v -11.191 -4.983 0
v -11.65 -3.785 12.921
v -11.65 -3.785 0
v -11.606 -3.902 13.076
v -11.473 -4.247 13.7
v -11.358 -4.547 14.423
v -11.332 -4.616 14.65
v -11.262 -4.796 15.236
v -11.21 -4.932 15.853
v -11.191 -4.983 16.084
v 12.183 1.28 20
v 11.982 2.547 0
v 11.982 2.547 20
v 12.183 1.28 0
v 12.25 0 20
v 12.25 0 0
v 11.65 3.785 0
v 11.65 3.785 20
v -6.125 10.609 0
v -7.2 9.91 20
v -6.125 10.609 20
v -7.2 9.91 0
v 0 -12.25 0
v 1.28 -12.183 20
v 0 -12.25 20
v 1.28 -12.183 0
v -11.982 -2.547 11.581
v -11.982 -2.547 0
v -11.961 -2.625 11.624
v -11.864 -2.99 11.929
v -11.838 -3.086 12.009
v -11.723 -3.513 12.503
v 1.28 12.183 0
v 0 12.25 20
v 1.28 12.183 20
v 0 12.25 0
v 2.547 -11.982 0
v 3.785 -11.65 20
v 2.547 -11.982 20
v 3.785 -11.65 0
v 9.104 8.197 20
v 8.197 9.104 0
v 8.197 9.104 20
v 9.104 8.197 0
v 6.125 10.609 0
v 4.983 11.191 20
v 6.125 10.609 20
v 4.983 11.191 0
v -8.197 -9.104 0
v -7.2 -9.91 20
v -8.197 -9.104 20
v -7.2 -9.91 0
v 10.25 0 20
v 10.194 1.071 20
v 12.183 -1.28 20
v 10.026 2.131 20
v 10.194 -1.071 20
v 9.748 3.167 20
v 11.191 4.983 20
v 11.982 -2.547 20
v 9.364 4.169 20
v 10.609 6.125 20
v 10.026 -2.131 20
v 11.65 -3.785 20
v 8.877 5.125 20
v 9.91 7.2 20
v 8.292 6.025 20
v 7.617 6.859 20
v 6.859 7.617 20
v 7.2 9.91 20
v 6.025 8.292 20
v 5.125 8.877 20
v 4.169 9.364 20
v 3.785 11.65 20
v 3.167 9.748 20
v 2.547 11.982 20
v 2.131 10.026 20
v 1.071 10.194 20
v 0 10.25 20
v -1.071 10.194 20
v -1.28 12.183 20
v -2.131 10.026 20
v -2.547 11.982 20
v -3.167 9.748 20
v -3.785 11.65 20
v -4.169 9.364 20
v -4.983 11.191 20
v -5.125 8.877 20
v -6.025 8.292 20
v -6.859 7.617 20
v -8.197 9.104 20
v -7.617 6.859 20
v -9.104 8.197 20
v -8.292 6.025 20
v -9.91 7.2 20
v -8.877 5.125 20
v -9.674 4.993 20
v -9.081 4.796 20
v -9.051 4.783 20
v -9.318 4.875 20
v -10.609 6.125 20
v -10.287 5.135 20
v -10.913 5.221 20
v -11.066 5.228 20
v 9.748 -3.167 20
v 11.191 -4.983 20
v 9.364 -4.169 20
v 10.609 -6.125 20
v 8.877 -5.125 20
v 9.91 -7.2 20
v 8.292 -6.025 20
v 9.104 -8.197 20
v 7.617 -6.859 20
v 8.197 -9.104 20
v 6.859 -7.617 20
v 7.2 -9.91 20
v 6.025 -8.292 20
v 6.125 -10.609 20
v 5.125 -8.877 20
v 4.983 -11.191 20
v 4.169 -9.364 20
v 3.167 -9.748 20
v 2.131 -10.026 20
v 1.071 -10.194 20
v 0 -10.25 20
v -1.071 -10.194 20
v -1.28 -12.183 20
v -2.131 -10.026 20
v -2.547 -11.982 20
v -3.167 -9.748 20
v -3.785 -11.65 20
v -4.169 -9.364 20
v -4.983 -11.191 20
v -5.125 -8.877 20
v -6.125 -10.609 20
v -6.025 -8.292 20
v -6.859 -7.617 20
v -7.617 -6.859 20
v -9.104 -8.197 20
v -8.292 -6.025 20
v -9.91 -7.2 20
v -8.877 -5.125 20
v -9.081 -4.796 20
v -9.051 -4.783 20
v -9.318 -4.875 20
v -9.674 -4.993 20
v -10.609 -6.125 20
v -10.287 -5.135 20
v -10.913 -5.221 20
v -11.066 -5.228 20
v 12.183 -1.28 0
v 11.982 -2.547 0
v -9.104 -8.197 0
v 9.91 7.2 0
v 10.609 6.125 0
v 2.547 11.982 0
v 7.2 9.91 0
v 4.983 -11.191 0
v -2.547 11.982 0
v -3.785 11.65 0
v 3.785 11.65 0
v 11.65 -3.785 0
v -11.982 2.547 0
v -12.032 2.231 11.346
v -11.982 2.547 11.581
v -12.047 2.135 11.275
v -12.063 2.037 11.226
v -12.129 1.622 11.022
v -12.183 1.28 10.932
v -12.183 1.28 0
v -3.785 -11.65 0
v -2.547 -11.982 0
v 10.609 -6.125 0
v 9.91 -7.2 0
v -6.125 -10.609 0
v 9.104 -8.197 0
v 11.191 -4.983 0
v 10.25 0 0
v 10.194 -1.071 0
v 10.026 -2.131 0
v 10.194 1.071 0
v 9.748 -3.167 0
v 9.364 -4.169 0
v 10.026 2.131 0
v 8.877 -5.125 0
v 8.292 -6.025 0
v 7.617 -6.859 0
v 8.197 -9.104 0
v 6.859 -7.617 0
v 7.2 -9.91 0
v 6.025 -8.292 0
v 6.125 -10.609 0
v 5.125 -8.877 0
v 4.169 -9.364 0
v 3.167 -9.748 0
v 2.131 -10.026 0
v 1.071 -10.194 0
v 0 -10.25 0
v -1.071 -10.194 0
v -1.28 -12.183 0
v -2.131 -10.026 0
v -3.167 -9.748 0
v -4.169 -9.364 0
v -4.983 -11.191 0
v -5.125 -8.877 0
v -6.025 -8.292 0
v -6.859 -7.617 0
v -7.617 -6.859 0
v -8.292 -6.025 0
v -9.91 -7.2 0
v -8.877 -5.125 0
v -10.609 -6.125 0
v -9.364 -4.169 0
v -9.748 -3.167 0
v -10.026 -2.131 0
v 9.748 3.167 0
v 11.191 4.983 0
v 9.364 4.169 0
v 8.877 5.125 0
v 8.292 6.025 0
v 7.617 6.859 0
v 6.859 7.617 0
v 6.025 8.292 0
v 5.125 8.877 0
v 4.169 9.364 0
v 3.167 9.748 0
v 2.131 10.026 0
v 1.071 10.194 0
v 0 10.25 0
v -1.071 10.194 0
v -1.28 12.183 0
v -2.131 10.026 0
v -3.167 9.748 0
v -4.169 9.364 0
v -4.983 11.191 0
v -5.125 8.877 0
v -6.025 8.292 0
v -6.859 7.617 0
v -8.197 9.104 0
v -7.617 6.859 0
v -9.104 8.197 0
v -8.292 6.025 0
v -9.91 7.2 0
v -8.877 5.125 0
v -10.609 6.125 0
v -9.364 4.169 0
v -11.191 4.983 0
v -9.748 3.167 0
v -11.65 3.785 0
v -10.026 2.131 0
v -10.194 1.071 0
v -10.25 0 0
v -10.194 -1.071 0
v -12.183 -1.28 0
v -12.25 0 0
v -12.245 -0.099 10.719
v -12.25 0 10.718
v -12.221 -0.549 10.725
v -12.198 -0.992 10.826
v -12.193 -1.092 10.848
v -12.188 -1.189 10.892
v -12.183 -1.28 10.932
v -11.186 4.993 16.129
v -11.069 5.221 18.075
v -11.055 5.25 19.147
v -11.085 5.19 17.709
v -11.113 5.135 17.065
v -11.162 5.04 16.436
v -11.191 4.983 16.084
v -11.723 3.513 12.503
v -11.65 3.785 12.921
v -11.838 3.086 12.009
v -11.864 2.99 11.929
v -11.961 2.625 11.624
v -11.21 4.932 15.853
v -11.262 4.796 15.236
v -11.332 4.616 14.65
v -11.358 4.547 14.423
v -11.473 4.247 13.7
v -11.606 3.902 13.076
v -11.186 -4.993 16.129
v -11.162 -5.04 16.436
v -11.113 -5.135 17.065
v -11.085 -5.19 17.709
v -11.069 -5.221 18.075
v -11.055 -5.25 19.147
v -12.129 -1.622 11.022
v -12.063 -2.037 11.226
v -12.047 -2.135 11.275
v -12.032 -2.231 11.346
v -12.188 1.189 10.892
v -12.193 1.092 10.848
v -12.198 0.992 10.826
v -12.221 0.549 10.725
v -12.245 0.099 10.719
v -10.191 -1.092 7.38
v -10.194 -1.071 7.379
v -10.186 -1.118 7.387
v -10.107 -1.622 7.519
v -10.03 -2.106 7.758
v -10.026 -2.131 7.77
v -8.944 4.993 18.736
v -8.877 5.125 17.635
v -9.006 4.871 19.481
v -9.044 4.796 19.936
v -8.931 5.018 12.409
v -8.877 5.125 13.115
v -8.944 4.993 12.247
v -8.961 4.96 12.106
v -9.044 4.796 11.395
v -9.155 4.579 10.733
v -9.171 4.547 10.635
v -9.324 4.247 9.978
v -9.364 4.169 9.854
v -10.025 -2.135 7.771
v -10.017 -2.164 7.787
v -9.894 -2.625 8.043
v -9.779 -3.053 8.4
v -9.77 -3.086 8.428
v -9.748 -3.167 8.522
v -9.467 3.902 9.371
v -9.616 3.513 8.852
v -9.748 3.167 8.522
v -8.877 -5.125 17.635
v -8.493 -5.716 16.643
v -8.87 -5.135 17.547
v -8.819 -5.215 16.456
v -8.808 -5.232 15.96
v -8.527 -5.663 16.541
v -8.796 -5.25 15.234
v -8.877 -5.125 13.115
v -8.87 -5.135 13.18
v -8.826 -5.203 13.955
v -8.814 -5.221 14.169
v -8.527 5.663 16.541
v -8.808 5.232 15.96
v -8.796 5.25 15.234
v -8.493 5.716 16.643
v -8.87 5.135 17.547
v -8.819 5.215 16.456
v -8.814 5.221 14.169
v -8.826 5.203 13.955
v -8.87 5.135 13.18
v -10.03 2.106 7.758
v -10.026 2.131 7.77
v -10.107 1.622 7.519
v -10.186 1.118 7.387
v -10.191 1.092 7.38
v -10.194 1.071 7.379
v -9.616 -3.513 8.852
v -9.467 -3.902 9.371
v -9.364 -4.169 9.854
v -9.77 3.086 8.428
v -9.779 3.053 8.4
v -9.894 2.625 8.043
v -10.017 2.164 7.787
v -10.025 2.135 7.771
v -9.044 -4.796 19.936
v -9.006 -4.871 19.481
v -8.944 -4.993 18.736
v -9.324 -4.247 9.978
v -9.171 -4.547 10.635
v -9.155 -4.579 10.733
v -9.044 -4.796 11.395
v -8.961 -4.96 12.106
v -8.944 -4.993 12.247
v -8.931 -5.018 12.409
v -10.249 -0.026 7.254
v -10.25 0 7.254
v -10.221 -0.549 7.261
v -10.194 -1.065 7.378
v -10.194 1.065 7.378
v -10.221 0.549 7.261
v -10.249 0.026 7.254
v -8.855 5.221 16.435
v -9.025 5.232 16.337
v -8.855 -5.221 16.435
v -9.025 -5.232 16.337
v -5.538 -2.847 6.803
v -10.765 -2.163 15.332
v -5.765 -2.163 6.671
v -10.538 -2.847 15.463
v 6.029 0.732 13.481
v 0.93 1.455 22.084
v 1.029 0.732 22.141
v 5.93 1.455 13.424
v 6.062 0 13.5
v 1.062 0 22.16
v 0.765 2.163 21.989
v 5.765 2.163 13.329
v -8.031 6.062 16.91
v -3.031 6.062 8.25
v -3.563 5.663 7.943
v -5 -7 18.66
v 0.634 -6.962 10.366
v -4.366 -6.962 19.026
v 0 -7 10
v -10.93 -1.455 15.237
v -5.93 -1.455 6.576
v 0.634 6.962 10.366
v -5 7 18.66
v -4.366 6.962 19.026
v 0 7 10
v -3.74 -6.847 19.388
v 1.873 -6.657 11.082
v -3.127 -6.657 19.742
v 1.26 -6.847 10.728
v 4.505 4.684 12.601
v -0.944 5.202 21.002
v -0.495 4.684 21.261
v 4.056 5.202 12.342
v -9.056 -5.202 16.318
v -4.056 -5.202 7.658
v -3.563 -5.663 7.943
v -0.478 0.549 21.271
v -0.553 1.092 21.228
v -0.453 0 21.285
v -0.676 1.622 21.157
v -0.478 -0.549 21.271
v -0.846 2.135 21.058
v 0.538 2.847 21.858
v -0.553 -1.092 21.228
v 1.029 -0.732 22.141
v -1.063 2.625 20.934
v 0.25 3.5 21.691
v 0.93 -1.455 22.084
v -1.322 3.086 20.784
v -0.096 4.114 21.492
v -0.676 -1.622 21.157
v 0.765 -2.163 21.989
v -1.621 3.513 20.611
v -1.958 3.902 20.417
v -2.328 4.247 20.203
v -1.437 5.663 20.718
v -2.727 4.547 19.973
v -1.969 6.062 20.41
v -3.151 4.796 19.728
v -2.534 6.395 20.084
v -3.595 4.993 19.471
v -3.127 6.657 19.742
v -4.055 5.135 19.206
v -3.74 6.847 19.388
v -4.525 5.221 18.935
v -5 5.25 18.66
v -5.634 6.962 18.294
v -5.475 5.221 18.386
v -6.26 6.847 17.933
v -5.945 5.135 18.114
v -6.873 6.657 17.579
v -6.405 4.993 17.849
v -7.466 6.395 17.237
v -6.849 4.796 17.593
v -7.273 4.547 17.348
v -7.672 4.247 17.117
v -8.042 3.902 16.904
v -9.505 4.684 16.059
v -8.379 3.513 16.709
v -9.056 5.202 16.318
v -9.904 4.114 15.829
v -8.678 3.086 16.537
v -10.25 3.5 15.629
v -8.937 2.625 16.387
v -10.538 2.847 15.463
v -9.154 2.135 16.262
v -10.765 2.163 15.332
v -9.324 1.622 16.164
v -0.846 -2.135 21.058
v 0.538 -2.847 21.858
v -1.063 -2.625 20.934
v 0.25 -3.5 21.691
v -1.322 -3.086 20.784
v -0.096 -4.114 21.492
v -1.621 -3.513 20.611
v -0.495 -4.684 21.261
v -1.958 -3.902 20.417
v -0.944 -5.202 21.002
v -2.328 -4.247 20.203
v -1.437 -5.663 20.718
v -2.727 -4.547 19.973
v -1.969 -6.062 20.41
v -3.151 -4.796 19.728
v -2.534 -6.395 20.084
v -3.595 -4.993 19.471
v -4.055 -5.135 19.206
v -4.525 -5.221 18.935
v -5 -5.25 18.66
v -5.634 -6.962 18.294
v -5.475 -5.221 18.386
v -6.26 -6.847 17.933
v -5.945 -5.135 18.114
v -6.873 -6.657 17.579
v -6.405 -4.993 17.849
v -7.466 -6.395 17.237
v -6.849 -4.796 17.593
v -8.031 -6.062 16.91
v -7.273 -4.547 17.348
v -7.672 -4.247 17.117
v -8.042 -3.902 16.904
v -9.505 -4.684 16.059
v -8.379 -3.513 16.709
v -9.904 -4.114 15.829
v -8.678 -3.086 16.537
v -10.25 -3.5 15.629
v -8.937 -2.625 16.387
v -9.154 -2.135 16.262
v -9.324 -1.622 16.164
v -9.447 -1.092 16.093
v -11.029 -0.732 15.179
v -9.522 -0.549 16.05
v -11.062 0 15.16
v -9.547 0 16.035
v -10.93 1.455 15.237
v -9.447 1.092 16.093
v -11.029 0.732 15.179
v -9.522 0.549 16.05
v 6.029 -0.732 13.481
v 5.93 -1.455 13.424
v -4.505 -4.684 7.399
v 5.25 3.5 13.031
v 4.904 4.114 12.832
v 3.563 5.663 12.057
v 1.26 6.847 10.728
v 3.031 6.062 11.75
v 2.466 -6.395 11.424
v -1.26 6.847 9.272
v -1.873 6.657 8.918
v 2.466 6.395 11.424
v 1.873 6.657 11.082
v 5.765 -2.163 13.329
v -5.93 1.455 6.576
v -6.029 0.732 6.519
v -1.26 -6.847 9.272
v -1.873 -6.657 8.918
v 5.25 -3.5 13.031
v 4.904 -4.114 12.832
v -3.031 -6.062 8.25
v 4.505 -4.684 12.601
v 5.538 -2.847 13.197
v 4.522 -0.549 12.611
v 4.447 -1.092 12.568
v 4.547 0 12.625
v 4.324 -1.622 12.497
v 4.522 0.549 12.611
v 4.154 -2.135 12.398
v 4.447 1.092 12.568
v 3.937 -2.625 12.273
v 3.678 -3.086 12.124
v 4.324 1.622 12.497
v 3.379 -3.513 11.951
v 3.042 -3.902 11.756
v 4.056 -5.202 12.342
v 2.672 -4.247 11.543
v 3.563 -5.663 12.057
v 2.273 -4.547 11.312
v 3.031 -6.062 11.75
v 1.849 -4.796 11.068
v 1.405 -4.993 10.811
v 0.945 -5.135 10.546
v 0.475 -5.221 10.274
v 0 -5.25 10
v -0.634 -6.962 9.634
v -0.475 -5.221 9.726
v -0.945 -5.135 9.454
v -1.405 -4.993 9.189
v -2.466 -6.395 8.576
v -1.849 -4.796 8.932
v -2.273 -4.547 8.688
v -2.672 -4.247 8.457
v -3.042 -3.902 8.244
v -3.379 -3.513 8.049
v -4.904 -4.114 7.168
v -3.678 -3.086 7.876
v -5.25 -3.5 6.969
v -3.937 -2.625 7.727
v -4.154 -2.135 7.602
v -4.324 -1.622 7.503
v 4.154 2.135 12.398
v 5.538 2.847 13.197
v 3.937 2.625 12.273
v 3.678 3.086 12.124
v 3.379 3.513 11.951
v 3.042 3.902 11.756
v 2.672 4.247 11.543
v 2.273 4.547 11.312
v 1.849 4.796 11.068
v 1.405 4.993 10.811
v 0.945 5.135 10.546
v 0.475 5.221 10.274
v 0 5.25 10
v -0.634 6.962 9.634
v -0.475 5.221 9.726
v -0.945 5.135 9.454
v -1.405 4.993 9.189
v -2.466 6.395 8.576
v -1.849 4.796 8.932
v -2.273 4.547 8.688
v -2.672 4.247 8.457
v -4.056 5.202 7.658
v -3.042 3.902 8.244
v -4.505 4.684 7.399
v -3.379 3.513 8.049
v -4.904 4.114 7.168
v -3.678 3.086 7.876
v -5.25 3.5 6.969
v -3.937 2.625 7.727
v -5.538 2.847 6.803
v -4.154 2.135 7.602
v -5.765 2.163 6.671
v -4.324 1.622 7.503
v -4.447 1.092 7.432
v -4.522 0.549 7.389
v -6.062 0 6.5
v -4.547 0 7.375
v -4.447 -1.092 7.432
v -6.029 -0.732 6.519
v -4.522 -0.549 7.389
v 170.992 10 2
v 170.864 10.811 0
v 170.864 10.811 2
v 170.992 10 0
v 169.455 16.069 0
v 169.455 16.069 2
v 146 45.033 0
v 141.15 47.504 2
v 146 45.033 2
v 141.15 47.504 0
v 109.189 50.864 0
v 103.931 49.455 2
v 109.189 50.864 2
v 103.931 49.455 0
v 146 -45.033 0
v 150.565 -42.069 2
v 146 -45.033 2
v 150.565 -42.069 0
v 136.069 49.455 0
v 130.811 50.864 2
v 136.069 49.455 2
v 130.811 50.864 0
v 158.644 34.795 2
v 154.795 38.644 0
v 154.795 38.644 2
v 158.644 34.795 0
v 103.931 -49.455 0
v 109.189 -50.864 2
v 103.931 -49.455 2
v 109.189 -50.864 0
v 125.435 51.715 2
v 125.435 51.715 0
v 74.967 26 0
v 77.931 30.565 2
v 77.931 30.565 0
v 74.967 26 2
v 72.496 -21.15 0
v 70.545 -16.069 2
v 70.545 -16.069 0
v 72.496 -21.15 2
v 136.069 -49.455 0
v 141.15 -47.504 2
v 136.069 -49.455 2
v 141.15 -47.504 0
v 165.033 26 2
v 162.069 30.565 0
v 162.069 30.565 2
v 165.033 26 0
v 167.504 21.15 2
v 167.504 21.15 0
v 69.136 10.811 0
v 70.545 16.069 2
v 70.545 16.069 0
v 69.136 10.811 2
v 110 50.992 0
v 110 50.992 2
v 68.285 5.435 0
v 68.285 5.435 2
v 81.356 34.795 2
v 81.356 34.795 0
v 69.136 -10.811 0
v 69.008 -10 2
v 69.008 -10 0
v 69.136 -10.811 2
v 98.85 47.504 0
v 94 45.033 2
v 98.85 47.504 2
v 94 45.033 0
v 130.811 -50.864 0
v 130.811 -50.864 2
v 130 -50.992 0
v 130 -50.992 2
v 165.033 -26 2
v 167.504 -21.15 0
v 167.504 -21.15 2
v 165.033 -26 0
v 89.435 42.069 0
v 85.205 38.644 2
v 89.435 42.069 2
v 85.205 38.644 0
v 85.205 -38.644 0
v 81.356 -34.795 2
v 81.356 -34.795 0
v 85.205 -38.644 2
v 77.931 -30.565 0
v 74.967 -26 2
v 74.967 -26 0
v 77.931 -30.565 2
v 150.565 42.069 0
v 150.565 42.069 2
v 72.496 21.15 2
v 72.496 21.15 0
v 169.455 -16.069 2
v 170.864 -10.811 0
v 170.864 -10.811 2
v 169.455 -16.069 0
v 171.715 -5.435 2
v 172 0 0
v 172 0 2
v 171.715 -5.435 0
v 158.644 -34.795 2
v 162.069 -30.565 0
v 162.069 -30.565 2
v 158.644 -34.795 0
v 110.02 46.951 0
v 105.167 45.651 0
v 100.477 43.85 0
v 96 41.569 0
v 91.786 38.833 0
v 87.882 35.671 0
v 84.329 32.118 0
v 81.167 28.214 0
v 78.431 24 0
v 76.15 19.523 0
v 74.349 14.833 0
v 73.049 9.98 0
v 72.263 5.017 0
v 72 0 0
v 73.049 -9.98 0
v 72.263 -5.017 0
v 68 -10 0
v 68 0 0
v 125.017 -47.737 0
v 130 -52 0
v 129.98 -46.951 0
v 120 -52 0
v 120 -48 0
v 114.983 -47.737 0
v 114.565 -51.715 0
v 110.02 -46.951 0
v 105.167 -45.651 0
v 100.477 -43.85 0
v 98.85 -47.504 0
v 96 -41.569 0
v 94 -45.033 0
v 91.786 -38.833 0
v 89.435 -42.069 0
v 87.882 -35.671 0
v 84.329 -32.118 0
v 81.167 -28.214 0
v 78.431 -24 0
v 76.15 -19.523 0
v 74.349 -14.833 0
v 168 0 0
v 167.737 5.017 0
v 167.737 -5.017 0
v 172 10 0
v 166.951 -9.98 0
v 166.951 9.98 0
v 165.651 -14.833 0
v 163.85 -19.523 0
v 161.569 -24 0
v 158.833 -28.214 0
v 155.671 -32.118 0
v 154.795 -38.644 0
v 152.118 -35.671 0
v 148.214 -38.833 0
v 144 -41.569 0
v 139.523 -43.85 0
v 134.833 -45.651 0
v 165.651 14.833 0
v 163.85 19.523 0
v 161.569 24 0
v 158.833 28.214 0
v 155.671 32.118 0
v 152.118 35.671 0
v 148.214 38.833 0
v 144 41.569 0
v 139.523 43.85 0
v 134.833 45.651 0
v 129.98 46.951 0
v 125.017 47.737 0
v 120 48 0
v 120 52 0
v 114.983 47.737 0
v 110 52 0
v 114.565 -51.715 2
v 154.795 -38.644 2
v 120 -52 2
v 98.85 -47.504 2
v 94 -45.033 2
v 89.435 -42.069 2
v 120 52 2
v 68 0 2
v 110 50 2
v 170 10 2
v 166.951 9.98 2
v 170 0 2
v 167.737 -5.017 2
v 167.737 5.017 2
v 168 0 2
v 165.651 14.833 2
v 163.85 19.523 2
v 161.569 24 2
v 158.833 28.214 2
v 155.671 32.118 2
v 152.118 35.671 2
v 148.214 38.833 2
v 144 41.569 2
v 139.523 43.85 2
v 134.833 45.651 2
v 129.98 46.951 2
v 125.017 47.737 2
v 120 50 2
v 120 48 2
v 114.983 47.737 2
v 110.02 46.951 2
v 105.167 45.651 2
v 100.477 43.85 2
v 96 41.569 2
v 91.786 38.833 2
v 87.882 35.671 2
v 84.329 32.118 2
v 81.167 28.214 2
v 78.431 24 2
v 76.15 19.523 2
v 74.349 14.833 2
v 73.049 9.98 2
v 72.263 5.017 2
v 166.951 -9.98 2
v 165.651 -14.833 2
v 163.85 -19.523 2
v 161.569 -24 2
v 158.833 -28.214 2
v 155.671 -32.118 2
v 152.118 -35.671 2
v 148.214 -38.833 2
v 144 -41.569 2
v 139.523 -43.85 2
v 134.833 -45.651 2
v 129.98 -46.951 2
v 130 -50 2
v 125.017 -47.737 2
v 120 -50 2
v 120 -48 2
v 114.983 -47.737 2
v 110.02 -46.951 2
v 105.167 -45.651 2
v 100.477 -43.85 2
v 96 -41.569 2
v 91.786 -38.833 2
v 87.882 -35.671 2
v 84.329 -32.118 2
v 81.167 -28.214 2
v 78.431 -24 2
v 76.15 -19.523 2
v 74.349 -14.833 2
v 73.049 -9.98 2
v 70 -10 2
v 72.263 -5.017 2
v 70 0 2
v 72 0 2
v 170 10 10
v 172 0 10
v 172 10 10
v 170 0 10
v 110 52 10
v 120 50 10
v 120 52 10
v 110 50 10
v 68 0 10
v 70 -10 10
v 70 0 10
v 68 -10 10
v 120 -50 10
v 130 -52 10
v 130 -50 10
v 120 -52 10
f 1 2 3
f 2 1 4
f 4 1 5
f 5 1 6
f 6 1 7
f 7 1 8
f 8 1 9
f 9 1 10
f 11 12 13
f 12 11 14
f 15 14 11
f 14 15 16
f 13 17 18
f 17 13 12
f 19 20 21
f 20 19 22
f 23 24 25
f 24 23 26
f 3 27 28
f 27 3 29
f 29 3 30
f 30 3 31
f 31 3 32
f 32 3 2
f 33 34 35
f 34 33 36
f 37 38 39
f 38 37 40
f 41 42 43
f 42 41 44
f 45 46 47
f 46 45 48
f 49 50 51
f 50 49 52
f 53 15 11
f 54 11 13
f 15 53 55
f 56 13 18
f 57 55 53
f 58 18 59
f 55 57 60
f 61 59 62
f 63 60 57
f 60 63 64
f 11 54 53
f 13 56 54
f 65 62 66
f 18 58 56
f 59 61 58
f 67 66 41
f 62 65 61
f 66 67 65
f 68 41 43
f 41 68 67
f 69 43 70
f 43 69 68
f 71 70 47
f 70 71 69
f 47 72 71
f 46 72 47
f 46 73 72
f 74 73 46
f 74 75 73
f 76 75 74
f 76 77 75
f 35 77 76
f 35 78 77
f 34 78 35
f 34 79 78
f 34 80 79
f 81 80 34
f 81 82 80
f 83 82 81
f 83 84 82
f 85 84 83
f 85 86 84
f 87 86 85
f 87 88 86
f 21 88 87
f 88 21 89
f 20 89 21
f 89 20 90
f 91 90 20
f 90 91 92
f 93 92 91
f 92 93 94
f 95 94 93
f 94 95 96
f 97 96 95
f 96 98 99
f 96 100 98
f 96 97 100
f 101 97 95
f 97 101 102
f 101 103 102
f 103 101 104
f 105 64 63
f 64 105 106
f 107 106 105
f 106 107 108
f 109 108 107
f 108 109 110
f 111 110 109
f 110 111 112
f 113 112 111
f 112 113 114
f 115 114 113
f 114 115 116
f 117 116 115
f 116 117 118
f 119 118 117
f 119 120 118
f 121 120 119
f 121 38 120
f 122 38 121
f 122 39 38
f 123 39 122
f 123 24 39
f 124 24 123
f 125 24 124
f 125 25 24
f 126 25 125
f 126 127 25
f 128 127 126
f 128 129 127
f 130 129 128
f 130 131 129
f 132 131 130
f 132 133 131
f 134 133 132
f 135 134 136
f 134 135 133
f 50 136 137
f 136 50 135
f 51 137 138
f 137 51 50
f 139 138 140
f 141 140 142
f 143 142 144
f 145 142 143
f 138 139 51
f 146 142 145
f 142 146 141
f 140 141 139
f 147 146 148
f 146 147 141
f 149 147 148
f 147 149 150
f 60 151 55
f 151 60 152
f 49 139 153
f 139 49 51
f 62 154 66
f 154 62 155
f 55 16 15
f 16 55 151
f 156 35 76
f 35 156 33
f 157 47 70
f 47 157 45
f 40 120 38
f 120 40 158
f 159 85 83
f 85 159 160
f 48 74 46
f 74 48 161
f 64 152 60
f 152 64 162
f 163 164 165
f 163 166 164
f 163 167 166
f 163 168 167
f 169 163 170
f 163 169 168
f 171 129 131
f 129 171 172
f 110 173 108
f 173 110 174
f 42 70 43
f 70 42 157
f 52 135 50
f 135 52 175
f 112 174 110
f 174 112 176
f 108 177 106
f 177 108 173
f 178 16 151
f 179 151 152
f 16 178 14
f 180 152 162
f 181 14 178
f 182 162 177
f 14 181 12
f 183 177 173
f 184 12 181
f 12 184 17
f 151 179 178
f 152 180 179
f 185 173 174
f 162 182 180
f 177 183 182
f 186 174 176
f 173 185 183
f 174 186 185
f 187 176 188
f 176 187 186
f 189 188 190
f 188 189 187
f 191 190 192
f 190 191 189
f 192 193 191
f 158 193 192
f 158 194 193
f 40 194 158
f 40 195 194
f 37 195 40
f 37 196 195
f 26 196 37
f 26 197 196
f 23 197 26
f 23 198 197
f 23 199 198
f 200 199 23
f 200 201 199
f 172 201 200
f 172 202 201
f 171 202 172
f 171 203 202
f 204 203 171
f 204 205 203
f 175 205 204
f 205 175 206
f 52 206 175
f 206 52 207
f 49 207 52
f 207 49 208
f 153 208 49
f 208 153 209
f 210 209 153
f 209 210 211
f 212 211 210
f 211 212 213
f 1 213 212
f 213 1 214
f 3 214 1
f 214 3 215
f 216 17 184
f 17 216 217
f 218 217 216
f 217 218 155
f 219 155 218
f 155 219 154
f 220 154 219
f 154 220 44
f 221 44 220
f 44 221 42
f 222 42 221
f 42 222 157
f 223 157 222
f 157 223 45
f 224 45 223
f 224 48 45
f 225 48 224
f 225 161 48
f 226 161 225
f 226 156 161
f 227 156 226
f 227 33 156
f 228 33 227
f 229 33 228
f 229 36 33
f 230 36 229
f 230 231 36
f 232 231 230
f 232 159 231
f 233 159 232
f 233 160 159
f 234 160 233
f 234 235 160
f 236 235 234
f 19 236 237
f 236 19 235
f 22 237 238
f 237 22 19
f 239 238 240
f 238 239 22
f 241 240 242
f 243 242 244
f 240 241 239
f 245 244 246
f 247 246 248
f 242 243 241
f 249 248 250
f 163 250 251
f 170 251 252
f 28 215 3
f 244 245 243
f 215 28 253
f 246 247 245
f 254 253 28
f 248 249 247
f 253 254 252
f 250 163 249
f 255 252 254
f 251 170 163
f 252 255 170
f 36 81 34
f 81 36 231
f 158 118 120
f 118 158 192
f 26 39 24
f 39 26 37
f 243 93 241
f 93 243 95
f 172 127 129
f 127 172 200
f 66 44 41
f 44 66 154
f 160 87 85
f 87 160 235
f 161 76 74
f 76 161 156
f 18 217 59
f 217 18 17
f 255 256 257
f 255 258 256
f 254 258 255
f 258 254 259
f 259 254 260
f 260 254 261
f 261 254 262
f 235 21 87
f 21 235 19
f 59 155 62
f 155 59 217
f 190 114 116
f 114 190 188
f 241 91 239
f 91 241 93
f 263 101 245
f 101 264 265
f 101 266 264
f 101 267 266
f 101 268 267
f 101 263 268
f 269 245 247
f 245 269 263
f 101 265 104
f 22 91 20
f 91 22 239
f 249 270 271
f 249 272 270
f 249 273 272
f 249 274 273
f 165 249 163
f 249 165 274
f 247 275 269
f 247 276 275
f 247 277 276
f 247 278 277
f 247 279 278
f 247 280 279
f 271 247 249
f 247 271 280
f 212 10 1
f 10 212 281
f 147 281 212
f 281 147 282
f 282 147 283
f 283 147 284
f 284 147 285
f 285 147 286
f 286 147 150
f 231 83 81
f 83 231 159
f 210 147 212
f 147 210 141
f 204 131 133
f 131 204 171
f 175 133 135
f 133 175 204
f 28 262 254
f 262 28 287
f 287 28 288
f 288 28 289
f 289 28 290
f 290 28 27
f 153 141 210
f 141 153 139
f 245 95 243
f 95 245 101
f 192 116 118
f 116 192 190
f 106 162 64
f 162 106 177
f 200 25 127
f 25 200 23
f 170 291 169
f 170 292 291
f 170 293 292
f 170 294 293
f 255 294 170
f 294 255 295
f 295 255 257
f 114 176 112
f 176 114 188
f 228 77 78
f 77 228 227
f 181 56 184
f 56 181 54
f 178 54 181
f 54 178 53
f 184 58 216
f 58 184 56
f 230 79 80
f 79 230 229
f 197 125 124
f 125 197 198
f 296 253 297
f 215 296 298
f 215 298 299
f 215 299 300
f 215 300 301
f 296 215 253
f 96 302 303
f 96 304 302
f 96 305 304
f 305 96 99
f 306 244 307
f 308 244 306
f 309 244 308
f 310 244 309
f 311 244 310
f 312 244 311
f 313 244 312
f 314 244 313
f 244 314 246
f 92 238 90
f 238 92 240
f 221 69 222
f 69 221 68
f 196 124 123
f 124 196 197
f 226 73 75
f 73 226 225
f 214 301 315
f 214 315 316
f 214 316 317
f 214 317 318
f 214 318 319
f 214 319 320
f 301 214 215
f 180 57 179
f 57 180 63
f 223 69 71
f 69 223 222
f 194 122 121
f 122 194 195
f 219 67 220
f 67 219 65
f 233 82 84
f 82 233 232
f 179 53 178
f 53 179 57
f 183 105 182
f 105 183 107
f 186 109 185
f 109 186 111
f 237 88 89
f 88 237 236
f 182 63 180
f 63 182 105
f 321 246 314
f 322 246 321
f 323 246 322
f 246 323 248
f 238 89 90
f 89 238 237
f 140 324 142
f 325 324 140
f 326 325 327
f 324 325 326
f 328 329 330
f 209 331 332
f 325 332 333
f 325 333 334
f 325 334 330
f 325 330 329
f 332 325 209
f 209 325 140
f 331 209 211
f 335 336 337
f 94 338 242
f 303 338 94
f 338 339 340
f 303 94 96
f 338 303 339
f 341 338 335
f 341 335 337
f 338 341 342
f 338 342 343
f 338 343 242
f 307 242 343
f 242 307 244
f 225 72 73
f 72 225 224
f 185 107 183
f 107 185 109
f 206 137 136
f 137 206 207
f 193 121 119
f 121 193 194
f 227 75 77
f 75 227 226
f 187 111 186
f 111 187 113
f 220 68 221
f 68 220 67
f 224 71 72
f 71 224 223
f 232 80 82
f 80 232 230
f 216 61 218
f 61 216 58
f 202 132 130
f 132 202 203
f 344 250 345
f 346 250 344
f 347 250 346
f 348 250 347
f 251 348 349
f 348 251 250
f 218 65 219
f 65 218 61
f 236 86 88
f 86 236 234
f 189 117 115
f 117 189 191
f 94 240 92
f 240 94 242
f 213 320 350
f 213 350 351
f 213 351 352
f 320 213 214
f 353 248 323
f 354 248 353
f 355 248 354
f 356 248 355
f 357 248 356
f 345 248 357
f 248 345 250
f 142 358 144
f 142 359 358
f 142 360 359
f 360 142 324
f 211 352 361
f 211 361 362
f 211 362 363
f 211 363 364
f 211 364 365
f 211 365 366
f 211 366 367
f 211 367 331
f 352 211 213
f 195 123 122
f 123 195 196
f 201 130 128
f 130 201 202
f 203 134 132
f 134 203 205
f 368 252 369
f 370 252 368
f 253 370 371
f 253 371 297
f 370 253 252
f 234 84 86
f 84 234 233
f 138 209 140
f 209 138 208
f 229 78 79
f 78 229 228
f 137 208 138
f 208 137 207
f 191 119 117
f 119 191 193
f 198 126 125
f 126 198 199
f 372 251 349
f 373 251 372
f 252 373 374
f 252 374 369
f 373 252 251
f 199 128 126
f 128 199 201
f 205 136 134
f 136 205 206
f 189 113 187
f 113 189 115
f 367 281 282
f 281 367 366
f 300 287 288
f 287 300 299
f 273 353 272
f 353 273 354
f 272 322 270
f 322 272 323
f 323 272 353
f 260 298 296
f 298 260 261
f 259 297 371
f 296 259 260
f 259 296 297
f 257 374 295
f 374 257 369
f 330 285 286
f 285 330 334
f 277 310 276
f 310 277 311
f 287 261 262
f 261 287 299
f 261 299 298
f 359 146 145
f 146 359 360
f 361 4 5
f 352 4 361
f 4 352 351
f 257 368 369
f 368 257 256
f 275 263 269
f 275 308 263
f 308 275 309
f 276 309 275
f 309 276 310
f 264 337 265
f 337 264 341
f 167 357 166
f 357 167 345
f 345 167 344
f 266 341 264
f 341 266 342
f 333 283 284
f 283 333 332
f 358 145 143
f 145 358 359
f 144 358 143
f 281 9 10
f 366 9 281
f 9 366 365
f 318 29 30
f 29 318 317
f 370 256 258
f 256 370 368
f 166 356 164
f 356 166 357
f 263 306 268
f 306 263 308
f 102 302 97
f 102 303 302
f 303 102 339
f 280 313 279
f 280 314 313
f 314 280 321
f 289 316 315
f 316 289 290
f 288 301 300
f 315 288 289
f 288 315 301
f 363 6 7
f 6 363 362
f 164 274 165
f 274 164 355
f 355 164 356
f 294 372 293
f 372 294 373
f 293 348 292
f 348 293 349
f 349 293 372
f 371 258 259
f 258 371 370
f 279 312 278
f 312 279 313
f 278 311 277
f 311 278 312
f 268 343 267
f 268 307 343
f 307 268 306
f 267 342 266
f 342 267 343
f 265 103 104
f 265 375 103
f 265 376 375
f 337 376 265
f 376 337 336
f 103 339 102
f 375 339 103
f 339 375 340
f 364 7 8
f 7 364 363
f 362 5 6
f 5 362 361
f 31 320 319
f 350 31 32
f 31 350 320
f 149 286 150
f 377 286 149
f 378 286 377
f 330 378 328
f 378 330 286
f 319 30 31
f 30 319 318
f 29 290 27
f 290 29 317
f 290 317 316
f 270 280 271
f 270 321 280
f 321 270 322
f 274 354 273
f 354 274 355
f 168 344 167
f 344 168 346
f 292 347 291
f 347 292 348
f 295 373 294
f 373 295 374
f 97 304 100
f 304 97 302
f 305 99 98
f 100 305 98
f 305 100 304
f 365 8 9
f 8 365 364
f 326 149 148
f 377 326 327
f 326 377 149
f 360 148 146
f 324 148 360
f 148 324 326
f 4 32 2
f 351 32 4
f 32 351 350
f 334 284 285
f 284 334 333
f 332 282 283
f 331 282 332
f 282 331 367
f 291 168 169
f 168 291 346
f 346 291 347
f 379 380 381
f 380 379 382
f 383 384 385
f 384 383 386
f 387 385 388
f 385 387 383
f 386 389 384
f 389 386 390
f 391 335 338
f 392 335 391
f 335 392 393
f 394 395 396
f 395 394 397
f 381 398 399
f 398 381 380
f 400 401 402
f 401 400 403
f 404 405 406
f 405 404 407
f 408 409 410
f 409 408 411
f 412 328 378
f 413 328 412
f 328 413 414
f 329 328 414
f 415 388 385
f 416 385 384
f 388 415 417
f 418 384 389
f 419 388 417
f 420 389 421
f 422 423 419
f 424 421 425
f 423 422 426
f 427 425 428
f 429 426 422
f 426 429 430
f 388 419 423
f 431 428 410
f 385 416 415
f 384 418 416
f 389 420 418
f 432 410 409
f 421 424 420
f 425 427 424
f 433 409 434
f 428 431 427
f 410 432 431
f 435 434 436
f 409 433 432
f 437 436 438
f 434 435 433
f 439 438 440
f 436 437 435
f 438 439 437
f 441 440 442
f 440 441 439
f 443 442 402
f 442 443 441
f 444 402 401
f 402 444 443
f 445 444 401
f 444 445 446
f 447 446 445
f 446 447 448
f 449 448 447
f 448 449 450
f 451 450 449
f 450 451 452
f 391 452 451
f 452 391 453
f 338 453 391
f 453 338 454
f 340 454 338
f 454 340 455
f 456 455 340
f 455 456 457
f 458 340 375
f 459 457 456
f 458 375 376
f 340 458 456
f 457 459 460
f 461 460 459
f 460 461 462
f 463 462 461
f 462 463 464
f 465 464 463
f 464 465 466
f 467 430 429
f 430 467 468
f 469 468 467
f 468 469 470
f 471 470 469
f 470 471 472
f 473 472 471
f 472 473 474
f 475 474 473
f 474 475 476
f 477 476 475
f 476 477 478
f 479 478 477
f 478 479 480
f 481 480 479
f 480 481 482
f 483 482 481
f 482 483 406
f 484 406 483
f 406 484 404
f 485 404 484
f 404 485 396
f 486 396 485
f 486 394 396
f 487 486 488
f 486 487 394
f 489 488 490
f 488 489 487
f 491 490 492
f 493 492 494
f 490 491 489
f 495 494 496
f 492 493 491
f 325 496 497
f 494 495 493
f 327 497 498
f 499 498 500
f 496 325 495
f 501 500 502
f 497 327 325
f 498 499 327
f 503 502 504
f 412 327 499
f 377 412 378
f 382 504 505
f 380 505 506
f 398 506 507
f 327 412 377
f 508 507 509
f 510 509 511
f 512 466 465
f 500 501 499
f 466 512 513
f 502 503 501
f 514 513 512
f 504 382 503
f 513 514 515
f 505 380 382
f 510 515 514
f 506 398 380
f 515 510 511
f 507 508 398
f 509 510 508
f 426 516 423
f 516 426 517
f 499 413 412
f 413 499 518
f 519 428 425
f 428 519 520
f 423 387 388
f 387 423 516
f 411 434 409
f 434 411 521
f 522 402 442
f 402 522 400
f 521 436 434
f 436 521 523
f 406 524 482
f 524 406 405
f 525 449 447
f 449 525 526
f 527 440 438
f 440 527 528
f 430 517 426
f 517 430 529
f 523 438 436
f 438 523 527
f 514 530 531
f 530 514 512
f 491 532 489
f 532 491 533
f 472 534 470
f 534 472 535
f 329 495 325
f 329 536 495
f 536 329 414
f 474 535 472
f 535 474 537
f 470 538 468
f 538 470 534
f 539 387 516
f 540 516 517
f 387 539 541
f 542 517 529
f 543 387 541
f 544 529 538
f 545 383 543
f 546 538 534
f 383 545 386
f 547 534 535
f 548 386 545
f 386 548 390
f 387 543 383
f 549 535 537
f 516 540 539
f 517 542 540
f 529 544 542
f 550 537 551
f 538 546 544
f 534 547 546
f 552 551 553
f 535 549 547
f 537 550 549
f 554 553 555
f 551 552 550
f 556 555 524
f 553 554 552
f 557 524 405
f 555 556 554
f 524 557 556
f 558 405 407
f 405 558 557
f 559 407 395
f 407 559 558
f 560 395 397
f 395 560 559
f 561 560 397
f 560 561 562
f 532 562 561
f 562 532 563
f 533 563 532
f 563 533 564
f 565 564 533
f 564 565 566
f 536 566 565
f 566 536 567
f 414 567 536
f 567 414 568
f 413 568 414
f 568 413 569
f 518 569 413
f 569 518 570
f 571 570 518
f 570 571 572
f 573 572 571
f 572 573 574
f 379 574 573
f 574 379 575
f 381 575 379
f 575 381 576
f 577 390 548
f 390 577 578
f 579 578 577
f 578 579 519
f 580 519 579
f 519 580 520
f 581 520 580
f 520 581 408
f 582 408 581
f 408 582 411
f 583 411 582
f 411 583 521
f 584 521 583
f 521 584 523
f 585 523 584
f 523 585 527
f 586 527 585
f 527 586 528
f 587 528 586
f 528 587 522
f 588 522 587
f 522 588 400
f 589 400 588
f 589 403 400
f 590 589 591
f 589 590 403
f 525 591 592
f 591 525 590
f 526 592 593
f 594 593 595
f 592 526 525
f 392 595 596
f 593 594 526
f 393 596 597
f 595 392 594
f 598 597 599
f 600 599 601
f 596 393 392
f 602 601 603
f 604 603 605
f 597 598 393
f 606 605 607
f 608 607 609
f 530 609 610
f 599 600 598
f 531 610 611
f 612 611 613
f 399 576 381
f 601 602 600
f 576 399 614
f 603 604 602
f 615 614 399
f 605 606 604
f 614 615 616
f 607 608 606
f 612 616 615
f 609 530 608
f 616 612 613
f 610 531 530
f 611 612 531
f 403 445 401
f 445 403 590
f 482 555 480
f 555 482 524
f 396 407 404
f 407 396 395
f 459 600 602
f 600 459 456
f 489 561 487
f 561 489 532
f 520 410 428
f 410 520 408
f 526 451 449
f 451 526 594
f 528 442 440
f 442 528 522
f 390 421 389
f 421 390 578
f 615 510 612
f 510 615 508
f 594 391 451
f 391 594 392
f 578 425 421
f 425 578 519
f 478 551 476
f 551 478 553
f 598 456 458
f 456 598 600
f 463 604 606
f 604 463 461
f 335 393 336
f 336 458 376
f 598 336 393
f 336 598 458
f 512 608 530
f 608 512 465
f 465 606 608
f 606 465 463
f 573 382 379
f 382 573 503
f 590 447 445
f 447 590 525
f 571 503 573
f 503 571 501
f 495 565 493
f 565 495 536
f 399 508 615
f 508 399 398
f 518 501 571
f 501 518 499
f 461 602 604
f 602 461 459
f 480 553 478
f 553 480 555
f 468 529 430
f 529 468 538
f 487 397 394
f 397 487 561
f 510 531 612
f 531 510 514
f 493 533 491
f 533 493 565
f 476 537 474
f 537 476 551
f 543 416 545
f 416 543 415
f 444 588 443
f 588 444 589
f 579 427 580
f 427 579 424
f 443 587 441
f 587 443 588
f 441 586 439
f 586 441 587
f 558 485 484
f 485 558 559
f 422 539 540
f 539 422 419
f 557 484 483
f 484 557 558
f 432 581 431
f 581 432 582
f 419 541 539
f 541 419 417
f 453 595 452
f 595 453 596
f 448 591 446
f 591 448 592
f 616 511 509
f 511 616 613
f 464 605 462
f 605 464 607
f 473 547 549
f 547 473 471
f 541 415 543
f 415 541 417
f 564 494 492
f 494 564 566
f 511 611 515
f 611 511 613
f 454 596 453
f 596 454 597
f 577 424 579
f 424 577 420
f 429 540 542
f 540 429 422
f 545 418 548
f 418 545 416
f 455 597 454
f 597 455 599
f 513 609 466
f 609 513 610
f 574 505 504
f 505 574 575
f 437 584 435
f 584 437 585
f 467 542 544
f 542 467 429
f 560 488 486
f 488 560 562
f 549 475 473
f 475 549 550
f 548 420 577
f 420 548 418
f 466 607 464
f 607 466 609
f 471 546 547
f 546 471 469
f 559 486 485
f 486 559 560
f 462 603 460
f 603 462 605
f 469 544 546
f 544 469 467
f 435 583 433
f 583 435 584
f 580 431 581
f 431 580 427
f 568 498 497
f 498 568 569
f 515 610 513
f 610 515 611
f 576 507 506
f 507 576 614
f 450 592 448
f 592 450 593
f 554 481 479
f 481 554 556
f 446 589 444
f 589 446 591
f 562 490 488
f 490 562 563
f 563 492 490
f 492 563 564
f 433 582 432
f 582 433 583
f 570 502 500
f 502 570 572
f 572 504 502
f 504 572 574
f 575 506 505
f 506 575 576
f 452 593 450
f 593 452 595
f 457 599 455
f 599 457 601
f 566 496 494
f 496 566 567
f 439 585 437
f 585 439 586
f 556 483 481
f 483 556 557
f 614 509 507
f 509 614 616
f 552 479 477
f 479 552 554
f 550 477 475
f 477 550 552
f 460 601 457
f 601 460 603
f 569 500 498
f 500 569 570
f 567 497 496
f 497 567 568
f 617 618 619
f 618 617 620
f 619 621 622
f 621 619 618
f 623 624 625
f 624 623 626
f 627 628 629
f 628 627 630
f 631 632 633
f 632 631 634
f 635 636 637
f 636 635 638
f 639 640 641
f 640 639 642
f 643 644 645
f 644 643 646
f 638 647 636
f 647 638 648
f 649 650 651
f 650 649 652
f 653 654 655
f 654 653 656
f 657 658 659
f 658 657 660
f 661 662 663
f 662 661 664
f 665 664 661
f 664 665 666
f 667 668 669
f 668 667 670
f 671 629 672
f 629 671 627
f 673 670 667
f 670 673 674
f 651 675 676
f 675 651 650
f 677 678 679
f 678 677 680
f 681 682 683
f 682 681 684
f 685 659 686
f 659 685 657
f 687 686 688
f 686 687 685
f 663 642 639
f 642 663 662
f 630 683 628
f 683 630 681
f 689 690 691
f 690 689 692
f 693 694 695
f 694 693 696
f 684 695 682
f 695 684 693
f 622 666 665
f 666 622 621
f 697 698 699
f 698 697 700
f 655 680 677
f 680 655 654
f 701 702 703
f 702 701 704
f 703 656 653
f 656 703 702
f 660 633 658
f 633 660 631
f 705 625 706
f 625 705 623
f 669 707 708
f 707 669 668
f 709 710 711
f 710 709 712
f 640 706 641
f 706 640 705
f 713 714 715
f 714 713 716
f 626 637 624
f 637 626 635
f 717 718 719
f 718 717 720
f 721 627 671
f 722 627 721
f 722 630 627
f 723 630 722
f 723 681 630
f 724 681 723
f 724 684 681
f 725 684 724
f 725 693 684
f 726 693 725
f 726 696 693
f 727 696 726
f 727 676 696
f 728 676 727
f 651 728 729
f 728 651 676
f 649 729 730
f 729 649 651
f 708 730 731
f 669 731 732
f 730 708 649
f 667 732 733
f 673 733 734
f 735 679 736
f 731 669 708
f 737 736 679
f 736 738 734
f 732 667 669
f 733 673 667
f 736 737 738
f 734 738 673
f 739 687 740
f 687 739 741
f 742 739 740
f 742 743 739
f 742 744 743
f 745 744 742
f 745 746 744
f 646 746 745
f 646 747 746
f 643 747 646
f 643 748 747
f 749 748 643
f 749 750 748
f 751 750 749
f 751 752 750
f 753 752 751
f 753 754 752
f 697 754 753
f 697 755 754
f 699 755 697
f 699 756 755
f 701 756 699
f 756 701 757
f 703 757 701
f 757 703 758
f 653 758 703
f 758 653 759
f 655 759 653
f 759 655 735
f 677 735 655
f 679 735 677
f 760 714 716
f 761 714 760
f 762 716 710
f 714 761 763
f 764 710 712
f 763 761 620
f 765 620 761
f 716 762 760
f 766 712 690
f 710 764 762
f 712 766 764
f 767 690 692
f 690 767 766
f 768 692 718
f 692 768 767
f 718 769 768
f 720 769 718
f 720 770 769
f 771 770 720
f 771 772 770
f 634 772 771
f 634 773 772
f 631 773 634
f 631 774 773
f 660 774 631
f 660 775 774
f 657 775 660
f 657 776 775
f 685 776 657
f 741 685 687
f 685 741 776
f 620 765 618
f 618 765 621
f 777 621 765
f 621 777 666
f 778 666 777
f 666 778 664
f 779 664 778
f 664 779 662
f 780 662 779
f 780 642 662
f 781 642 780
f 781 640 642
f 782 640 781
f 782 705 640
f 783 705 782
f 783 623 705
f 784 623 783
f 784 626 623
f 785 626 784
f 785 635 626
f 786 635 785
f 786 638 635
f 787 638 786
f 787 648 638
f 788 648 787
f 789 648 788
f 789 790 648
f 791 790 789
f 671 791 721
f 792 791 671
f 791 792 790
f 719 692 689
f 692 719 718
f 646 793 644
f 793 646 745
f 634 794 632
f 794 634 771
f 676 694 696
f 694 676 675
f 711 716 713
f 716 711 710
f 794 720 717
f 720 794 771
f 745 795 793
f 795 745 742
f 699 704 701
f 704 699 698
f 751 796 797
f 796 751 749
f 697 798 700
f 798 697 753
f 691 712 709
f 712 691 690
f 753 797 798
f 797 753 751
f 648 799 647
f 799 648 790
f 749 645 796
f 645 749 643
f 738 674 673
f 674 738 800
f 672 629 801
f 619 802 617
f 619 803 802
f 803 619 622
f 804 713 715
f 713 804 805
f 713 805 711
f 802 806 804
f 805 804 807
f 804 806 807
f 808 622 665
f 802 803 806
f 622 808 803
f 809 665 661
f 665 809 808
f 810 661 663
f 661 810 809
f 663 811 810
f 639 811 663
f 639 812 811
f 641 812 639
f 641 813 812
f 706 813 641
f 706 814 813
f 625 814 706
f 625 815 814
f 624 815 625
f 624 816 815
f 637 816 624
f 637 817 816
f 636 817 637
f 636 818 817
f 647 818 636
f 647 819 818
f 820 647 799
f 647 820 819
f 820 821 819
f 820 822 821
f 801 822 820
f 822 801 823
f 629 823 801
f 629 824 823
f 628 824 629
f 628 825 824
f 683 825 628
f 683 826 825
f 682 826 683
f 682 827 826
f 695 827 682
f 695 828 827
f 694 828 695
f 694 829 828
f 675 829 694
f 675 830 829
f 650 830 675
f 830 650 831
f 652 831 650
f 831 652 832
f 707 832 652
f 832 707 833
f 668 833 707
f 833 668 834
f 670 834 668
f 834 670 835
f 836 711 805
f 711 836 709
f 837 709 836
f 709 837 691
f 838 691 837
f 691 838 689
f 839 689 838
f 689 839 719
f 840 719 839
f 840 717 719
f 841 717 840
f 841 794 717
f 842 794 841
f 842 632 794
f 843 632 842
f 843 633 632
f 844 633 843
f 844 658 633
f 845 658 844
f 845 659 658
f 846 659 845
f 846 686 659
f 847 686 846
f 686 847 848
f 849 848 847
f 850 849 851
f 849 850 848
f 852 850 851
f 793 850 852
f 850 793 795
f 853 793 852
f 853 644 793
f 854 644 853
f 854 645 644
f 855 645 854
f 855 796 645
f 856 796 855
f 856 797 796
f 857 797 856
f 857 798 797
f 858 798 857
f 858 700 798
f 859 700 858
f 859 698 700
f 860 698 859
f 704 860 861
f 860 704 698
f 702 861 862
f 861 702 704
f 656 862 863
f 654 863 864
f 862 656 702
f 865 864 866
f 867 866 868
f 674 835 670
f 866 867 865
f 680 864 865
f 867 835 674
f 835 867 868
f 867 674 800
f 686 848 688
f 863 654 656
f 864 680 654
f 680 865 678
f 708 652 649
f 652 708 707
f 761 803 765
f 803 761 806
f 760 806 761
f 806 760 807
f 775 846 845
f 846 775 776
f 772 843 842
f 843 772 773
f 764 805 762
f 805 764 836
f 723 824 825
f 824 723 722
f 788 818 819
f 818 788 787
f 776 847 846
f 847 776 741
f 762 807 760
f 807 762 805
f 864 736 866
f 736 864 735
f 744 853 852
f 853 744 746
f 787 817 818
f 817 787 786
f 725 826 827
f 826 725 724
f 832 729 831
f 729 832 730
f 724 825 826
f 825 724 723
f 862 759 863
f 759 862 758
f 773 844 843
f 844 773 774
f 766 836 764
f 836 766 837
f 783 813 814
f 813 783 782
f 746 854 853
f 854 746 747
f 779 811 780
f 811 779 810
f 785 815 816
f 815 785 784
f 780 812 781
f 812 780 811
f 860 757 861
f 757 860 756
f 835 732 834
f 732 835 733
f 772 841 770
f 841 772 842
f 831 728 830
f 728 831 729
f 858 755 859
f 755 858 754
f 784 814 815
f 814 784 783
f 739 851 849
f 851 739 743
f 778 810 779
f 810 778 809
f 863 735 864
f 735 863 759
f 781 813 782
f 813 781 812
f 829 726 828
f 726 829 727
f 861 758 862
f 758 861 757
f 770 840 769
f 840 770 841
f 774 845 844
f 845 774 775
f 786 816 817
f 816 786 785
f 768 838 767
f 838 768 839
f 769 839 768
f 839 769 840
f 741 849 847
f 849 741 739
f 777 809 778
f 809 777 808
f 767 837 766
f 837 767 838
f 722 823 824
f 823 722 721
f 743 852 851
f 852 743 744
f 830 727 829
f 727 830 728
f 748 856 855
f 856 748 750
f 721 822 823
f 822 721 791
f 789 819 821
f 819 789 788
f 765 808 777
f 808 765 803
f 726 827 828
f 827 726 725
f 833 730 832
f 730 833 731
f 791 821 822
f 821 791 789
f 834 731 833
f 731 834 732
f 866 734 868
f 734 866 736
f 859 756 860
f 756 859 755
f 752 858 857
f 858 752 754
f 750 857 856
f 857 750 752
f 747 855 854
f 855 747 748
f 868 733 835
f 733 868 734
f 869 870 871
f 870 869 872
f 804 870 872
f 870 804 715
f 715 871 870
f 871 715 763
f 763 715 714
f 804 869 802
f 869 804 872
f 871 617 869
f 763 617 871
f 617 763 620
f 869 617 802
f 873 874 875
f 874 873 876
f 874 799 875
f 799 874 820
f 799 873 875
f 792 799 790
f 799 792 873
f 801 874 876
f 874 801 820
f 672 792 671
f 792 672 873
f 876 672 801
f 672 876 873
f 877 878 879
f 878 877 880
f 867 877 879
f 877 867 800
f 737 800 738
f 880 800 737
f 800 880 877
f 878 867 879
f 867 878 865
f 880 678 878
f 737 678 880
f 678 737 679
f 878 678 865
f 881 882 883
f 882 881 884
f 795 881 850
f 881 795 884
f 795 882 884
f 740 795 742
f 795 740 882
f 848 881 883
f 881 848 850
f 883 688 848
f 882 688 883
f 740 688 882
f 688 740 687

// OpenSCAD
// Minimal 3D-printed scaffolding for Kelly Kettle water distillation
// Adapts spout for tubing and supports condenser coil

// Parameters (adjust based on your Kelly Kettle and tubing)
spout_diameter = 20; // Outer diameter of Kelly Kettle spout (mm)
tubing_od = 10; // Outer diameter of plastic/copper tubing (mm)
wall_thickness = 2; // Thickness of printed parts (mm)
tolerance = 0.5; // Fit tolerance for spout and tubing (mm)
coil_diameter = 100; // Approximate diameter of condenser coil (mm)
coil_holder_height = 50; // Height of coil holder (mm)

// Module: Spout Adapter
// Clamps onto kettle spout, provides port for tubing
module spout_adapter() {
    difference() {
        // Main body: cylinder to fit over spout
        cylinder(d=spout_diameter + 2*wall_thickness + tolerance, h=20, $fn=60);
        // Hole for spout
        translate([0, 0, -0.1])
            cylinder(d=spout_diameter + tolerance, h=20.2, $fn=60);
        // Hole for tubing (angled for steam exit)
        rotate([0, -30, 0])
            translate([0, 0, 10])
                cylinder(d=tubing_od + tolerance, h=30, $fn=60);
    }
    // Tubing support flange
    translate([0, 0, 10])
        rotate([0, -30, 0])
            difference() {
                cylinder(d=tubing_od + 2*wall_thickness, h=10, $fn=60);
                translate([0, 0, -0.1])
                    cylinder(d=tubing_od + tolerance, h=10.2, $fn=60);
            }
}

// Module: Condenser Coil Holder
// Frame to hold coiled tubing in cold water bath
module coil_holder() {
    // Base ring to rest on container
    difference() {
        cylinder(d=coil_diameter + 2*wall_thickness, h=wall_thickness, $fn=60);
        translate([0, 0, -0.1])
            cylinder(d=coil_diameter - 2*wall_thickness, h=wall_thickness + 0.2, $fn=60);
    }
    // Vertical supports (4 arms) to hold coil
    for (i = [0:3]) {
        rotate([0, 0, i*90])
            translate([coil_diameter/2, 0, 0])
                difference() {
                    // Arm
                    cube([wall_thickness, 10, coil_holder_height]);
                    // Notches for tubing (spaced to hold coil loops)
                    for (z = [10:10:coil_holder_height-10]) {
                        translate([-0.1, 5 - tubing_od/2, z])
                            cube([wall_thickness + 0.2, tubing_od + tolerance, tubing_od]);
                    }
                }
    }
}

// Render components
// Spout adapter
translate([0, 0, 0])
    spout_adapter();

// Condenser coil holder (positioned for visualization, adjust for printing)
translate([coil_diameter + 20, 0, 0])
    coil_holder();
